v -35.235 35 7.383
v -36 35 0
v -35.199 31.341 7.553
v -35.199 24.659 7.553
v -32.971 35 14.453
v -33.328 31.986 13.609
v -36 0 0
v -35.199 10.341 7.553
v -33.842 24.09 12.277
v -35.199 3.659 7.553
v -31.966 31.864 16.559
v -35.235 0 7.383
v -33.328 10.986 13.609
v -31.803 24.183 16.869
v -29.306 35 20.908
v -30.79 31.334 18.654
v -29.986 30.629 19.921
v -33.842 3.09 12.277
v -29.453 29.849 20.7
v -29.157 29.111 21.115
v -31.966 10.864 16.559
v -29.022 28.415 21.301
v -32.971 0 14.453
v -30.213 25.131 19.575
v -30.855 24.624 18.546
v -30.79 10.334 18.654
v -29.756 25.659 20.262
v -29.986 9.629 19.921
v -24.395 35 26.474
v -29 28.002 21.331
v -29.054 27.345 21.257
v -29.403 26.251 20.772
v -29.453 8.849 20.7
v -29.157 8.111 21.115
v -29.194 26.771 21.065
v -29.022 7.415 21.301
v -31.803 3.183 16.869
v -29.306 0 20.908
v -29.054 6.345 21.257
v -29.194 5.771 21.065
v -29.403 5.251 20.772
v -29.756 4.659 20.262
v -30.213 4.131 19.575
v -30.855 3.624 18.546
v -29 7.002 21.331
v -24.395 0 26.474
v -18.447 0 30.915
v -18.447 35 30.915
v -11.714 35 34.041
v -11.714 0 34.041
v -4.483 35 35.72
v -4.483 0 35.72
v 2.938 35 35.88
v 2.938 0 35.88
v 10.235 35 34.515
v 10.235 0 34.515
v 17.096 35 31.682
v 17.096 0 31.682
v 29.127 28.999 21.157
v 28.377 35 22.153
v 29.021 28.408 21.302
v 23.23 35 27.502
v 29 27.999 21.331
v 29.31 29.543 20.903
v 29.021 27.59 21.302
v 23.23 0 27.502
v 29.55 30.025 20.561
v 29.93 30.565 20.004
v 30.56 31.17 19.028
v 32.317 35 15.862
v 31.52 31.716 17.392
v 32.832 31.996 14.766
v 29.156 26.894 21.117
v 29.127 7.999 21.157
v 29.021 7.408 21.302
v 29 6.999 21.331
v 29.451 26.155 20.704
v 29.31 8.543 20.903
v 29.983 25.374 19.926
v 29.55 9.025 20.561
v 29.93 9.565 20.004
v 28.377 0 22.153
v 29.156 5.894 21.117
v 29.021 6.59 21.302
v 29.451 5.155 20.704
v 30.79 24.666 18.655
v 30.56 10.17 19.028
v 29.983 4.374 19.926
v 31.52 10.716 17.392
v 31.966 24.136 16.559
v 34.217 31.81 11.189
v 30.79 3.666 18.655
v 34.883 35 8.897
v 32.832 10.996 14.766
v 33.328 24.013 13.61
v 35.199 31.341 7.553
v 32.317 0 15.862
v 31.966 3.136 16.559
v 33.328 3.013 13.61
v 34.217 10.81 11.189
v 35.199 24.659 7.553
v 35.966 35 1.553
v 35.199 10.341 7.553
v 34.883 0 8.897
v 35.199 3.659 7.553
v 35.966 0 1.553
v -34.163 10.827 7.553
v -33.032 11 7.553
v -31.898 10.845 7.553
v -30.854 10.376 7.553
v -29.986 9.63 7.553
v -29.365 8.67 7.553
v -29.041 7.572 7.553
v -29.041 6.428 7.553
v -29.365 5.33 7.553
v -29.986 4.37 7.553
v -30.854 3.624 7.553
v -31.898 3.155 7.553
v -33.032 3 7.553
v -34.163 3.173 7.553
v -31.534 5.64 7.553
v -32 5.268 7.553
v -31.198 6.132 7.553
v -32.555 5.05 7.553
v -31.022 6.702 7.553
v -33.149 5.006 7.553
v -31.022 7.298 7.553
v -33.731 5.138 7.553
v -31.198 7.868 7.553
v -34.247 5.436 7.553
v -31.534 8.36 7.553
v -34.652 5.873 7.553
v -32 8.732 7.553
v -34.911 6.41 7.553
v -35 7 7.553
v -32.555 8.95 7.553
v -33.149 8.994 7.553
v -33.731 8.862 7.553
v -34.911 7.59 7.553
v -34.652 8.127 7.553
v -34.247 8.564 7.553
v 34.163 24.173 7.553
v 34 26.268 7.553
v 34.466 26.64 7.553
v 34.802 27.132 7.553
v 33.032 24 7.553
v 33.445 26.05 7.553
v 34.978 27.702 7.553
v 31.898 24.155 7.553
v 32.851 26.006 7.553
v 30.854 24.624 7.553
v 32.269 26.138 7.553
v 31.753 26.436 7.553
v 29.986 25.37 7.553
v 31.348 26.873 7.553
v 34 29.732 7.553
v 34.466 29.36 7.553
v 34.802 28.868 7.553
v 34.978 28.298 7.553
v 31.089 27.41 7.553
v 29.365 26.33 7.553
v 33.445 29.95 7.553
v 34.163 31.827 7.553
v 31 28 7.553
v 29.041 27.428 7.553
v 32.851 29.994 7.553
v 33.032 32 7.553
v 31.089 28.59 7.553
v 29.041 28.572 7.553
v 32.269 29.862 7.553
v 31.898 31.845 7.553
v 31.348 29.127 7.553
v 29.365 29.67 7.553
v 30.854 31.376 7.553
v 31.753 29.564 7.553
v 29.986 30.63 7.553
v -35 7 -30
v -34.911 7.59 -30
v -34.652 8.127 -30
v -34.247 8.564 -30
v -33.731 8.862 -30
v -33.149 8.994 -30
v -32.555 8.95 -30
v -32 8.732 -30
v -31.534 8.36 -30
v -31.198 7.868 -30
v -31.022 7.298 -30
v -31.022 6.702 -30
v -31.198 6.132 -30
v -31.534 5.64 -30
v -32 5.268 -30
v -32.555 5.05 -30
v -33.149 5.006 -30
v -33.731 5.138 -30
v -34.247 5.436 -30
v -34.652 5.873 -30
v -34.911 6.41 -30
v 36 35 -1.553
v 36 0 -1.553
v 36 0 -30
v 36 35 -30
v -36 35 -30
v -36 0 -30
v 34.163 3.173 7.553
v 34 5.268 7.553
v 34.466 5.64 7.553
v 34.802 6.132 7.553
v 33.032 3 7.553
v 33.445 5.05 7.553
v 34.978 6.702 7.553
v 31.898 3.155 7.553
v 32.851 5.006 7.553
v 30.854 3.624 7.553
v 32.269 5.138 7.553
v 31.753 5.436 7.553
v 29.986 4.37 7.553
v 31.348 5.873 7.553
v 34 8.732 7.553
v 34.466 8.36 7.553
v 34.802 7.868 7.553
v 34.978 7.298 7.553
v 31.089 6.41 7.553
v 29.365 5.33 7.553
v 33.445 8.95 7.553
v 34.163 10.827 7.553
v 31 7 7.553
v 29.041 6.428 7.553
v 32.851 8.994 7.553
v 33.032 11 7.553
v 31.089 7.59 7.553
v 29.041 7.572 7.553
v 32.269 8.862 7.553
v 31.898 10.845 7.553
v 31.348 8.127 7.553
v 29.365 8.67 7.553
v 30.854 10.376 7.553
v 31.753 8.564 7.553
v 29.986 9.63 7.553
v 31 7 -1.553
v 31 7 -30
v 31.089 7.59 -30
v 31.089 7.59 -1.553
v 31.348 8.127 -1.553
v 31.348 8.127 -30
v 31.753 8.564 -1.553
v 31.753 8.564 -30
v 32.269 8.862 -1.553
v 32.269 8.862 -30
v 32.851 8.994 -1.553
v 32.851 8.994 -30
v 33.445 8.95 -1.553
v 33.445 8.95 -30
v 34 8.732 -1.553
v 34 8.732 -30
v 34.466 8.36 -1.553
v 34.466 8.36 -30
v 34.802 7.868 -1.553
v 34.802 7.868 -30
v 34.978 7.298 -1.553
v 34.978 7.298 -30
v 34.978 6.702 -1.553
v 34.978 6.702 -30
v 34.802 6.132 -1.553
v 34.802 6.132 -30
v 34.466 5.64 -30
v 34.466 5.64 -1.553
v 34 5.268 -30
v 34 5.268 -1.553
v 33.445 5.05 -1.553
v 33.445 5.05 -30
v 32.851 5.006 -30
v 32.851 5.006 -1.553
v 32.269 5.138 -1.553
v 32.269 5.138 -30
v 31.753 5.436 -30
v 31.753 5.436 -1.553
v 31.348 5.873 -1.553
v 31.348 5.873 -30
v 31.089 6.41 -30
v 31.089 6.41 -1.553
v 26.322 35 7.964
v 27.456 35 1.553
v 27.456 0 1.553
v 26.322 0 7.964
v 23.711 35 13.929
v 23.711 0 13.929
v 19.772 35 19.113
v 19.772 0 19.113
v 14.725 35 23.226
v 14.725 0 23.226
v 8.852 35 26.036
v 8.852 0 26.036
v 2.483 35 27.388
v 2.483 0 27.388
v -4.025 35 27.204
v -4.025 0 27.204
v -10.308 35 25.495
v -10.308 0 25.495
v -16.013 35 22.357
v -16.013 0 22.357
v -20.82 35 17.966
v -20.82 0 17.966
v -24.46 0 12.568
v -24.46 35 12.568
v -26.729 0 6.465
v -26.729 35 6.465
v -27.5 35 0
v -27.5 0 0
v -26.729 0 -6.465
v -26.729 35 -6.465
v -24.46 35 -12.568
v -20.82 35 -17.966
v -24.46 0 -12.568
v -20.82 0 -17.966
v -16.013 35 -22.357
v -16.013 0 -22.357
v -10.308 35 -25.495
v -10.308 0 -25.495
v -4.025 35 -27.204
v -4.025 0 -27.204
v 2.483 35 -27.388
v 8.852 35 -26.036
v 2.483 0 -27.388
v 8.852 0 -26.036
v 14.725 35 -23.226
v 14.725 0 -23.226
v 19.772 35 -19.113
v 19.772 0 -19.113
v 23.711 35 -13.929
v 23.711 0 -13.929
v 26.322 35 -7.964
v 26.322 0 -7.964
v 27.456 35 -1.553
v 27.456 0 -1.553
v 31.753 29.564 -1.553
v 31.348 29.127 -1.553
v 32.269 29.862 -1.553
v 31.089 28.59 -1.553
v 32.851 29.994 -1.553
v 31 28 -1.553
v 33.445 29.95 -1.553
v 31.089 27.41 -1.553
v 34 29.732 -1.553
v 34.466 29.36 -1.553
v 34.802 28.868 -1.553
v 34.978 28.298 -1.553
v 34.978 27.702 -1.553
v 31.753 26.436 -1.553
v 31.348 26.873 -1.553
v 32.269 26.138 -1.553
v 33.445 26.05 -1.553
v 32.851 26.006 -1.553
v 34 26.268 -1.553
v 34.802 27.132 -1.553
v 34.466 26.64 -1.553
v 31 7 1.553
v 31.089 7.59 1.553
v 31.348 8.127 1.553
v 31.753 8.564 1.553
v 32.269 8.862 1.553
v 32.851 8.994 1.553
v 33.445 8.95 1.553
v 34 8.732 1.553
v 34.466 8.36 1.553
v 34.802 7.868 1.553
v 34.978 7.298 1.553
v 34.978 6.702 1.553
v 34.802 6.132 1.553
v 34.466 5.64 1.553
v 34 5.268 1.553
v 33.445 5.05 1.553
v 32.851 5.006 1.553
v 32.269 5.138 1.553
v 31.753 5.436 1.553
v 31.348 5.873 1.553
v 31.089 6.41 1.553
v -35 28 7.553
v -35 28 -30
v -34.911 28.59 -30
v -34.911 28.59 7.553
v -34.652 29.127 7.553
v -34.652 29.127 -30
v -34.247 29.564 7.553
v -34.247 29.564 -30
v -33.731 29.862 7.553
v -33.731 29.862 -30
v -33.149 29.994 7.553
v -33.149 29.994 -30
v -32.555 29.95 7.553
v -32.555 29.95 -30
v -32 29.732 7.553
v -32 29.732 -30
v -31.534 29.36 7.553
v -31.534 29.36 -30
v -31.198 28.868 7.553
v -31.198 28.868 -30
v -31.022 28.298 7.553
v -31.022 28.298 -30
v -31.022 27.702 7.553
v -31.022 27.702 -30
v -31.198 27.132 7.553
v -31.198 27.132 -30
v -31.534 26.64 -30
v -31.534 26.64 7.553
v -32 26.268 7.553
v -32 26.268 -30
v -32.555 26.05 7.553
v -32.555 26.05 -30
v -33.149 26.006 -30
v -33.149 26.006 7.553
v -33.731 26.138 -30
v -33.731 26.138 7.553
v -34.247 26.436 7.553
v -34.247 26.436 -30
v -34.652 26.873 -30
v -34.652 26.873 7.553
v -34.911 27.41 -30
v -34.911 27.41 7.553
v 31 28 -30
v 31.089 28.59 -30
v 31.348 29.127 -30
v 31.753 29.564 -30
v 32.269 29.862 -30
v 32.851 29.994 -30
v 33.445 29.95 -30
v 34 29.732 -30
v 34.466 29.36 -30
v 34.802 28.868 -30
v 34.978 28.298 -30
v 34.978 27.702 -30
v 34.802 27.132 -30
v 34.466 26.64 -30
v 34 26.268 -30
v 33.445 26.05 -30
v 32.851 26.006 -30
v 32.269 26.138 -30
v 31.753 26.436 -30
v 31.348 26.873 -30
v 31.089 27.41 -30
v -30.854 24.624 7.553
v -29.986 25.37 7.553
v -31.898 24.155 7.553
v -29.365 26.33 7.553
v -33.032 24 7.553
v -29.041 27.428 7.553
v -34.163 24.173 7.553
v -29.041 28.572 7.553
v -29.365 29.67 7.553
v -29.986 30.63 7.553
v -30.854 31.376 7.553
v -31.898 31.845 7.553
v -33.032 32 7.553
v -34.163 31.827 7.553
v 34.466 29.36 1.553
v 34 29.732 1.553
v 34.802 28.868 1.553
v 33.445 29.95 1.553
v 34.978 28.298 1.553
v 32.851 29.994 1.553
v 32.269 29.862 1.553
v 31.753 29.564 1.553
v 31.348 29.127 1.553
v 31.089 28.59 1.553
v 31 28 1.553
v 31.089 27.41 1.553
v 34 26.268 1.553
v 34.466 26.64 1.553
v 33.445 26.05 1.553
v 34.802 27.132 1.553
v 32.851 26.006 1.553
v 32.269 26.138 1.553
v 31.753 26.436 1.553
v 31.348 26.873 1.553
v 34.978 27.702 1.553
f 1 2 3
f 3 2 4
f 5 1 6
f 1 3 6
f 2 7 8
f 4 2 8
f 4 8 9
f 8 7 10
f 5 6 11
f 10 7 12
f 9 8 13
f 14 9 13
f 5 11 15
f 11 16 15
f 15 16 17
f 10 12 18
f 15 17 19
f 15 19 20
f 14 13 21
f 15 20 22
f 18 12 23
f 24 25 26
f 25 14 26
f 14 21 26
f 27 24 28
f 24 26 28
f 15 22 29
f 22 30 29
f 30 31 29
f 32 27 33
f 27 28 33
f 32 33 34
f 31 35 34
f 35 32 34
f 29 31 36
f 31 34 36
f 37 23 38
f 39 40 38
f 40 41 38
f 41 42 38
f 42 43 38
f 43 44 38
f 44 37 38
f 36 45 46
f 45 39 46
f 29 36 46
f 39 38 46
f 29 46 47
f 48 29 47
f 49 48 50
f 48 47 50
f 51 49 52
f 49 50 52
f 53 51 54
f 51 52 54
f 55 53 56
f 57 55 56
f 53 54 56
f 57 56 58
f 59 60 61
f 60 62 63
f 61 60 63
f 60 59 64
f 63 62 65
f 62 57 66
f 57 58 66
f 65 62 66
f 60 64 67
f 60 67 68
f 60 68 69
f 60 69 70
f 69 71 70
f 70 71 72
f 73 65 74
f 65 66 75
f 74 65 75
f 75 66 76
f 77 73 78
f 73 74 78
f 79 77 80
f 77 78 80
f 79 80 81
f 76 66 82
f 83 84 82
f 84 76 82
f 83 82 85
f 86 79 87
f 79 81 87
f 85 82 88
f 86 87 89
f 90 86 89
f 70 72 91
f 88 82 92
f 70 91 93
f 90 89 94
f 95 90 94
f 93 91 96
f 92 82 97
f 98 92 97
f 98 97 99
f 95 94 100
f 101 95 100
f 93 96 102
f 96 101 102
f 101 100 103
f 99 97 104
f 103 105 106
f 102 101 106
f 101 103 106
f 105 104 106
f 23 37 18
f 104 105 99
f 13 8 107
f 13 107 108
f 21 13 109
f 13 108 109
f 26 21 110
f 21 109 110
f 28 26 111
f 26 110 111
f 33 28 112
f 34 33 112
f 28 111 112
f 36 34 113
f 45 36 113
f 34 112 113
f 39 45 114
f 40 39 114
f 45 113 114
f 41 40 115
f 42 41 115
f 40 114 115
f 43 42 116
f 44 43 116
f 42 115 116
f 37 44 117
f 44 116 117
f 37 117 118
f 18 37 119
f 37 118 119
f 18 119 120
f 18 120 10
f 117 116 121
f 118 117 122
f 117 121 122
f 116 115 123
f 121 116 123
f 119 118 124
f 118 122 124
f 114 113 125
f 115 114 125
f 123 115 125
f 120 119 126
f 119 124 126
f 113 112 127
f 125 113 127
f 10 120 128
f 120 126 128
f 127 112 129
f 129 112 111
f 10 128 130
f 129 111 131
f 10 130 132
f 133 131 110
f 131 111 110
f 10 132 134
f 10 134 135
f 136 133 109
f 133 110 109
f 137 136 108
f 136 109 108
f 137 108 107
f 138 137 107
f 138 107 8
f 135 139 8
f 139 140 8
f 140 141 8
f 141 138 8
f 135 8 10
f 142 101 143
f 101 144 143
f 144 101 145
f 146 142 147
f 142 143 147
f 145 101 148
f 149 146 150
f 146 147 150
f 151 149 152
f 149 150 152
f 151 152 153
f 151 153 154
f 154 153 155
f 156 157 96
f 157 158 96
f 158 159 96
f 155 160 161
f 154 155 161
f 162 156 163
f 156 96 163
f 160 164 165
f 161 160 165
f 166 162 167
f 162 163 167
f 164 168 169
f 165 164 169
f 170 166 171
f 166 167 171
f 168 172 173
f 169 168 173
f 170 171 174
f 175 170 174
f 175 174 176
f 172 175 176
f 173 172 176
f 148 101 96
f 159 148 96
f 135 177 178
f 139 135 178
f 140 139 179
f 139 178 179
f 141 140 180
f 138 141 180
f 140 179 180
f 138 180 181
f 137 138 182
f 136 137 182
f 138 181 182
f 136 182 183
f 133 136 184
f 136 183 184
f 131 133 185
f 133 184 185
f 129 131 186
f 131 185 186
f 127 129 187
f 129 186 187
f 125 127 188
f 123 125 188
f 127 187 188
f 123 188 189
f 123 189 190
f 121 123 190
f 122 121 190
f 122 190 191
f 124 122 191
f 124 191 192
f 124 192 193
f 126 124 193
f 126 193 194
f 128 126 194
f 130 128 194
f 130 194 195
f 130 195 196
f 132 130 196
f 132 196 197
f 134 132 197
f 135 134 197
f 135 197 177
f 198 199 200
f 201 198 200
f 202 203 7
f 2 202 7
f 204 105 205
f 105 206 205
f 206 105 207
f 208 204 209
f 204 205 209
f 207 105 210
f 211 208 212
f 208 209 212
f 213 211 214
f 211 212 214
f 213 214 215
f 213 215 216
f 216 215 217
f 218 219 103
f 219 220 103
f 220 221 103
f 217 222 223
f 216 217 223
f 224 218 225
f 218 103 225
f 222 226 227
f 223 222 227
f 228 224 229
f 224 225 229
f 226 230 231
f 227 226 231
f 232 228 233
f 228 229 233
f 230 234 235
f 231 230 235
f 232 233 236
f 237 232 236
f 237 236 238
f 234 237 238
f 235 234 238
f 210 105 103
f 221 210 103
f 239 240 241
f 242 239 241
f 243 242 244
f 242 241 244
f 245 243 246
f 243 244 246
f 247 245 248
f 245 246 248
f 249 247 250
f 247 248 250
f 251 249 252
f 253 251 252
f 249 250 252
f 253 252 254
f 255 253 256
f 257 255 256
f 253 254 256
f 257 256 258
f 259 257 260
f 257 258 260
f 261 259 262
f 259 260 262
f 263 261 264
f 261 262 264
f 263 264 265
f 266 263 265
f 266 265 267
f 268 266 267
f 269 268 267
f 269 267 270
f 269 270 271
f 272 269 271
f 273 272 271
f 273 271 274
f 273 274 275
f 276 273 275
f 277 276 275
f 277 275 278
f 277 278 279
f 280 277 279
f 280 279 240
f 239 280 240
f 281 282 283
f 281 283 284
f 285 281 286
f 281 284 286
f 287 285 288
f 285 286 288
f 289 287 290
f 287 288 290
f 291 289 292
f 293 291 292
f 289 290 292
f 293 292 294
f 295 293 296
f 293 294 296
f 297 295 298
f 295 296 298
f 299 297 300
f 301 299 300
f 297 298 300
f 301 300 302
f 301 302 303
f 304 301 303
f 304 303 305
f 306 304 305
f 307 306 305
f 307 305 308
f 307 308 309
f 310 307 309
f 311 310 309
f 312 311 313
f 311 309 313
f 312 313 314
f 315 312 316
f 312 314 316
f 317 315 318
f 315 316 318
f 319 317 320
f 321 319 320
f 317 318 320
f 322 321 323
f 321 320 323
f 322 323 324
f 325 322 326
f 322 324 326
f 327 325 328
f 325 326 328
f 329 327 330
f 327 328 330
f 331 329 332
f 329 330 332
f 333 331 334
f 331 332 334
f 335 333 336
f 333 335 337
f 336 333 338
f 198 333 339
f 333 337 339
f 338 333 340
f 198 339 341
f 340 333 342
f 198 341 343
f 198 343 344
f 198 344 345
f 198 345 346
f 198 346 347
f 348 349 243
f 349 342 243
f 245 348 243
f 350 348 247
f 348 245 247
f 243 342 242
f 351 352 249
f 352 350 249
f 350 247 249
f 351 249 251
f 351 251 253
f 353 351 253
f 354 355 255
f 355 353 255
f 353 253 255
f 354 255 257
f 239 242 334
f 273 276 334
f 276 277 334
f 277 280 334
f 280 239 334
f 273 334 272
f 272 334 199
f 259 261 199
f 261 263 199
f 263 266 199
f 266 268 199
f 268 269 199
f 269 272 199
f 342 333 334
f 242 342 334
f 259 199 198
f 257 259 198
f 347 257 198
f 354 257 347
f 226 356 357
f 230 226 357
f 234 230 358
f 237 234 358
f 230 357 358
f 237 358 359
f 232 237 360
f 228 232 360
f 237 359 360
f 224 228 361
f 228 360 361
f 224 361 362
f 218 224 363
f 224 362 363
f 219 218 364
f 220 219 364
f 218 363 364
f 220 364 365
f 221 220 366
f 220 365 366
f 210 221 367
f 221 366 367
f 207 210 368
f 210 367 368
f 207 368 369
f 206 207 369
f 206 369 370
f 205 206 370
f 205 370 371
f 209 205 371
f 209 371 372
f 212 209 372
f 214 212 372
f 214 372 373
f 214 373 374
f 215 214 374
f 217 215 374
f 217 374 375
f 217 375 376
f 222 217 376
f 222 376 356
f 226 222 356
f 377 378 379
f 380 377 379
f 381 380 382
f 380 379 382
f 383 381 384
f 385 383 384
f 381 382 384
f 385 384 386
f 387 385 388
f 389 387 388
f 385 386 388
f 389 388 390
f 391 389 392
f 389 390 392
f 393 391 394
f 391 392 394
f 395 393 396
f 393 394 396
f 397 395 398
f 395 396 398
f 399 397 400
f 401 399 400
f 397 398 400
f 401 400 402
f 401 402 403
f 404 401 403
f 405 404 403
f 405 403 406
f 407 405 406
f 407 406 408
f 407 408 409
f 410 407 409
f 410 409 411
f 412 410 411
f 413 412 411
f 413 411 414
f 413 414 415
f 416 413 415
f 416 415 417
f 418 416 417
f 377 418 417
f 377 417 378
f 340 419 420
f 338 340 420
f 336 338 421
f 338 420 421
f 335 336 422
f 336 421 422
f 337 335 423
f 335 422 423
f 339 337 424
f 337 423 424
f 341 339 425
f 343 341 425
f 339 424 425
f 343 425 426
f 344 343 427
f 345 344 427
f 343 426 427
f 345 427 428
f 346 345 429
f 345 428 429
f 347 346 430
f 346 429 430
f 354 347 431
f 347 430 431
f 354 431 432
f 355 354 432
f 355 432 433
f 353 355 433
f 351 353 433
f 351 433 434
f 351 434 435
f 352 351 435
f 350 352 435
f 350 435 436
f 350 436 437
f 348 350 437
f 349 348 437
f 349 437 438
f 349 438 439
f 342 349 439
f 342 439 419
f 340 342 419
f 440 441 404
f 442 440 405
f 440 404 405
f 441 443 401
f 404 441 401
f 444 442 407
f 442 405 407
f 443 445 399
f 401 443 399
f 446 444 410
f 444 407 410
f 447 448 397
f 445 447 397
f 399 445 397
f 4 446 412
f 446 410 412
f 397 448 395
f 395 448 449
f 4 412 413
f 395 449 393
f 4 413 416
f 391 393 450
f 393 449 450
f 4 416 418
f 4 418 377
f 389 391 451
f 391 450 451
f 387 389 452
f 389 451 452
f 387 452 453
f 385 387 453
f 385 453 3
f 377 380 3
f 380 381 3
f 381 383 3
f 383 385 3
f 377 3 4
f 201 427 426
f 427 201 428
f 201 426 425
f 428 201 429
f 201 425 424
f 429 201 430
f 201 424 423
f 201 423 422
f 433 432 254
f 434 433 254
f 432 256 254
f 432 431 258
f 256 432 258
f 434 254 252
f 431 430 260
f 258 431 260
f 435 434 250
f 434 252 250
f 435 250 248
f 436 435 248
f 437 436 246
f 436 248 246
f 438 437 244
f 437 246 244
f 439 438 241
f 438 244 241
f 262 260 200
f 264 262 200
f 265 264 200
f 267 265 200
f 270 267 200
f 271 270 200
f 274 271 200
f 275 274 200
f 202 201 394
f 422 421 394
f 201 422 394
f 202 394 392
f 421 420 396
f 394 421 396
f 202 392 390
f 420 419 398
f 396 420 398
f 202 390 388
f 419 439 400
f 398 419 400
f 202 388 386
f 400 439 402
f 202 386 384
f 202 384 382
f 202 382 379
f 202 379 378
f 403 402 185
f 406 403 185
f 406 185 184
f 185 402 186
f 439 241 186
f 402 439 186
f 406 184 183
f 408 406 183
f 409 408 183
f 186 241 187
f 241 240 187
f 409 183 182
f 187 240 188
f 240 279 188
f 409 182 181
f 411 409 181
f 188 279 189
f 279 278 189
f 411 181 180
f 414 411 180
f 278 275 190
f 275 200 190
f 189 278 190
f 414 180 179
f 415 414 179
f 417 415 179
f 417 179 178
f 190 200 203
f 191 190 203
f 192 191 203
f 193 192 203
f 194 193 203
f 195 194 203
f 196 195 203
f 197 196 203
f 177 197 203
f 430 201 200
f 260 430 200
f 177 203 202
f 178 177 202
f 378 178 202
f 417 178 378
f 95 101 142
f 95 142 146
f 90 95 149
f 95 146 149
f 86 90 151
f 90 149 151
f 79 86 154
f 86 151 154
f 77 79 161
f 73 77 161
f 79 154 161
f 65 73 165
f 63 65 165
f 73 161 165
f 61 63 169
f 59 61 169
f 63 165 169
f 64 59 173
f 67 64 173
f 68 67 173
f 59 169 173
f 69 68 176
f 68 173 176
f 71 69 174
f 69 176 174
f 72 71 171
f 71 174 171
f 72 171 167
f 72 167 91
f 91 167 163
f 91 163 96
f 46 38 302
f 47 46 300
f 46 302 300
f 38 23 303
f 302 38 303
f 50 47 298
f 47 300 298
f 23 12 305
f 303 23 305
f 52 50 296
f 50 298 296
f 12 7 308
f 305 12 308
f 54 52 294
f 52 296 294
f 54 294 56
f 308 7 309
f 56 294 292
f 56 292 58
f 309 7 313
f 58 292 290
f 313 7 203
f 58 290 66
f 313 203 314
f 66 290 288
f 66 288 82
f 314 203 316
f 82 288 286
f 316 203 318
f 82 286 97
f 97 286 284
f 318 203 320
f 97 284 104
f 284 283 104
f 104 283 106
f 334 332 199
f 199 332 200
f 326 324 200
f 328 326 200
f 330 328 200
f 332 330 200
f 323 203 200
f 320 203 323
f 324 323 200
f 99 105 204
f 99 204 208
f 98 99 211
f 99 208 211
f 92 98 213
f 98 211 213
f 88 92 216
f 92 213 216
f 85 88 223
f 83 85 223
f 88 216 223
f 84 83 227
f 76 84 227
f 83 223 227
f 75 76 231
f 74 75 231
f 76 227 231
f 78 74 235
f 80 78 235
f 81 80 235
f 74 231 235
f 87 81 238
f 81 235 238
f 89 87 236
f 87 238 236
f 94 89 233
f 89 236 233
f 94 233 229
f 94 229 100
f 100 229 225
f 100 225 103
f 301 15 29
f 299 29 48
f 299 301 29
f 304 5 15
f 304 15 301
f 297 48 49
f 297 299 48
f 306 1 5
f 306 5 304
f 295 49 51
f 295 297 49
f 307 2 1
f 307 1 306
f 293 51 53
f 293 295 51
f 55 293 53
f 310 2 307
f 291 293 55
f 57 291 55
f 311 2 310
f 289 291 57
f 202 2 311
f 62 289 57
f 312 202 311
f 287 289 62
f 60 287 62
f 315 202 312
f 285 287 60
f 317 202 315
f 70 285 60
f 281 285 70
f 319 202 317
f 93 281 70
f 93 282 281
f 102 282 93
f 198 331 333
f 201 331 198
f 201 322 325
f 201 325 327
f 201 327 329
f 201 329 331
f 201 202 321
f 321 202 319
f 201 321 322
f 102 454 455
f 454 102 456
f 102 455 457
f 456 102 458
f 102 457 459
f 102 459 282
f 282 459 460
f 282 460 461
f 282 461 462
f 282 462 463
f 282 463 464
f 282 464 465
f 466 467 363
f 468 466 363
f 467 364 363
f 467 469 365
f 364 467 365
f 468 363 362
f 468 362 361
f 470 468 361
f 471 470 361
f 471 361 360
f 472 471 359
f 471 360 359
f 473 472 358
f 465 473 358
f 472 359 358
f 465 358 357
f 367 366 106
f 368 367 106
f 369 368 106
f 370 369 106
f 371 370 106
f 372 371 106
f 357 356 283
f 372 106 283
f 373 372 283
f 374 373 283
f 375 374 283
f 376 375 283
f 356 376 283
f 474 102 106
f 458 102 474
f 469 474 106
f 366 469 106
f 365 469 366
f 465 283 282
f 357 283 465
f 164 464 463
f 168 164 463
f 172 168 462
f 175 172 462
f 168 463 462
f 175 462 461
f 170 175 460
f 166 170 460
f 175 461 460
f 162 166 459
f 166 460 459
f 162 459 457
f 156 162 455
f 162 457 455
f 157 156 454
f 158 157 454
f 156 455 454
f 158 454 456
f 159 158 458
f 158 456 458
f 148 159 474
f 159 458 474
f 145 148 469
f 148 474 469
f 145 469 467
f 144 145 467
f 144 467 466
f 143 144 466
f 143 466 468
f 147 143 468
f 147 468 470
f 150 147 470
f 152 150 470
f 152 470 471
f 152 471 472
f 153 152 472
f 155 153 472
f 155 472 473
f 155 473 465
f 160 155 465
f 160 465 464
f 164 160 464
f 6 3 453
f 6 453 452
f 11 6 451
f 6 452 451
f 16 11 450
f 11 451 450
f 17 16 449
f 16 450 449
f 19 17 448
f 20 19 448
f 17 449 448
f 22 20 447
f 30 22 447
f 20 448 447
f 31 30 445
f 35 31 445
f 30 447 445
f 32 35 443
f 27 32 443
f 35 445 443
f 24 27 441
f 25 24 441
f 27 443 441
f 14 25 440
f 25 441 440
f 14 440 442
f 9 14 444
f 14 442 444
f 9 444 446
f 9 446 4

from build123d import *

# Parameters (mm, degrees)
BOSS_EXTRUDE1_DEPTH = 35
SKETCH2_R           = 2
CUT_EXTRUDE1_DEPTH  = 83.927679336
CUT_EXTRUDE2_REACH  = 64.699
SKETCH3_R           = 4


with BuildPart() as part:
    # Sketch1 → Boss-Extrude1 (new body)
    with BuildSketch(Plane(origin=(0, 0, 0), x_dir=(1, 0, 0), z_dir=(0, 1, 0))):
        with BuildLine():
            Line((-36, 30), (-36, 0))
            ThreePointArc((-36, 0), (-0.776670285, -35.991621015), (35.966487959, -1.552979031))
            Line((35.966487959, -1.552979031), (27.456115095, -1.552979031))
            ThreePointArc((27.456115095, -1.552979031), (-27.5, 0), (27.456115095, 1.552979031))
            Line((27.456115095, 1.552979031), (36, 1.552979031))
            Line((36, 1.552979031), (36, 30))
            Line((36, 30), (-36, 30))
        make_face()
    extrude(amount=BOSS_EXTRUDE1_DEPTH)

    # Sketch2 → Cut-Extrude1 (cut, through all)
    with BuildSketch(Plane(origin=(0, 0, -30), x_dir=(-1, 0, 0), z_dir=(0, 0, -1))):
        with Locations((-33, 28)):
            Circle(SKETCH2_R)
        with Locations((33, 28)):
            Circle(SKETCH2_R)
        with Locations((33, 7)):
            Circle(SKETCH2_R)
        with Locations((-33, 7)):
            Circle(SKETCH2_R)
    extrude(amount=-CUT_EXTRUDE1_DEPTH, mode=Mode.SUBTRACT)

    # Sketch3 → Cut-Extrude2 (cut, up to next)
    with BuildSketch(Plane(origin=(0, 0, 7.552979031), x_dir=(-1, 0, 0), z_dir=(0, 0, -1)), mode=Mode.PRIVATE) as cut_extrude2_sk1:
        with Locations((-33, 28)):
            Circle(SKETCH3_R)
    cut_extrude2_tool1 = extrude(cut_extrude2_sk1.sketch, amount=-CUT_EXTRUDE2_REACH, mode=Mode.PRIVATE) & part.part
    # Sketch3 → Cut-Extrude2 (cut, up to next)
    with BuildSketch(Plane(origin=(0, 0, 7.552979031), x_dir=(-1, 0, 0), z_dir=(0, 0, -1)), mode=Mode.PRIVATE) as cut_extrude2_sk2:
        with Locations((-33, 7)):
            Circle(SKETCH3_R)
    cut_extrude2_tool2 = extrude(cut_extrude2_sk2.sketch, amount=-CUT_EXTRUDE2_REACH, mode=Mode.PRIVATE) & part.part
    # Sketch3 → Cut-Extrude2 (cut, up to next)
    with BuildSketch(Plane(origin=(0, 0, 7.552979031), x_dir=(-1, 0, 0), z_dir=(0, 0, -1)), mode=Mode.PRIVATE) as cut_extrude2_sk3:
        with Locations((33, 28)):
            Circle(SKETCH3_R)
    cut_extrude2_tool3 = extrude(cut_extrude2_sk3.sketch, amount=-CUT_EXTRUDE2_REACH, mode=Mode.PRIVATE) & part.part
    # Sketch3 → Cut-Extrude2 (cut, up to next)
    with BuildSketch(Plane(origin=(0, 0, 7.552979031), x_dir=(-1, 0, 0), z_dir=(0, 0, -1)), mode=Mode.PRIVATE) as cut_extrude2_sk4:
        with Locations((33, 7)):
            Circle(SKETCH3_R)
    cut_extrude2_tool4 = extrude(cut_extrude2_sk4.sketch, amount=-CUT_EXTRUDE2_REACH, mode=Mode.PRIVATE) & part.part
    add(cut_extrude2_tool1.solids().sort_by_distance((33, 28, 7.552979))[0], mode=Mode.SUBTRACT)
    add(cut_extrude2_tool2.solids().sort_by_distance((33, 7, 7.552979))[0], mode=Mode.SUBTRACT)
    add(cut_extrude2_tool3.solids().sort_by_distance((-33, 28, 7.552979))[0], mode=Mode.SUBTRACT)
    add(cut_extrude2_tool4.solids().sort_by_distance((-33, 7, 7.552979))[0], mode=Mode.SUBTRACT)


solid = part.part
